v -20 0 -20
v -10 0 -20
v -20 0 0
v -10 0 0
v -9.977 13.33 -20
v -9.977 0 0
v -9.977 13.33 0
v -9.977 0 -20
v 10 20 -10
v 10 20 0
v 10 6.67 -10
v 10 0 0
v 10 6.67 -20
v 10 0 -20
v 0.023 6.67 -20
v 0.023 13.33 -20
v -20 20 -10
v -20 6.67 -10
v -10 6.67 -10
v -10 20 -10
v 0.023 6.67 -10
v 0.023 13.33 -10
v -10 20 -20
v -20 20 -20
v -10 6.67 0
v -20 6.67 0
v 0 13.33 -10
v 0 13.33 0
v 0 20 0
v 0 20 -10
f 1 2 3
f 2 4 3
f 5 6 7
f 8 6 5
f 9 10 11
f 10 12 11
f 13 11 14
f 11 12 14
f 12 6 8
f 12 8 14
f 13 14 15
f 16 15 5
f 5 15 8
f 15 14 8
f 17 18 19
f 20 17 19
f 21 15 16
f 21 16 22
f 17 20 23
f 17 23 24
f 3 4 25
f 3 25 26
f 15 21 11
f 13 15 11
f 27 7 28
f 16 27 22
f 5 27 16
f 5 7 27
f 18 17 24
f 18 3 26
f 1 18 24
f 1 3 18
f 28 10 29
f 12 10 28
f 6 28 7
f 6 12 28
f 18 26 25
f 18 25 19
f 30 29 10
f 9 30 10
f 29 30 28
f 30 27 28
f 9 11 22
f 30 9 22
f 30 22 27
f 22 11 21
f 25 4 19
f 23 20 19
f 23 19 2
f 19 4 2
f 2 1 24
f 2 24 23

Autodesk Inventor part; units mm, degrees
sketch "Sketch1" plane through (0, 0, 0) normal (0, 1, 0) x (-1, 0, 0)
  line L0 (0, 0) -> (30, 0)
  line L1 (30, 0) -> (30, -20)
  line L2 (30, -20) -> (0, -20)
  line L3 (0, -20) -> (0, 0)
  line L4 (0, 0) -> (10, 0)
  line L5 (10, 0) -> (10, -10)
  line L6 (10, -10) -> (0, -10)
  line L7 (0, -10) -> (0, 0)
  line L8 (10, 0) -> (20, 0)
  line L9 (20, 0) -> (20, -10)
  line L10 (20, -10) -> (10, -10)
  line L11 (10, -10) -> (10, 0)
  line L12 (20, 0) -> (30, 0)
  line L13 (30, 0) -> (30, -10)
  line L14 (30, -10) -> (20, -10)
  line L15 (20, -10) -> (20, 0)
  line L16 (0, -10) -> (10, -10)
  line L17 (10, -10) -> (10, -20)
  line L18 (10, -20) -> (0, -20)
  line L19 (0, -20) -> (0, -10)
  line L20 (10, -10) -> (20, -10)
  line L21 (20, -10) -> (20, -20)
  line L22 (20, -20) -> (10, -20)
  line L23 (10, -20) -> (10, -10)
  line L24 (20, -10) -> (30, -10)
  line L25 (30, -10) -> (30, -20)
  line L26 (30, -20) -> (20, -20)
  line L27 (20, -20) -> (20, -10)
  dimension "d0" = 30
  dimension "d1" = 20
  dimension "d2" = 10
  dimension "d3" = 10
extrude "Extrusion1" add sketch "Sketch1" along normal blind 20 contours L10 L21 L2 L17
ref_plane "Work Plane2" through (-10, 0, -10) normal (0, 1, 0) x (0, 0, -1)
sketch "Sketch2" plane through (-10, 0, -10) normal (0, 1, 0) x (0, 0, -1)
  line L0 (0, 0) -> (-10, 0)
  line L1 (-10, 0) -> (-10, 10)
  line L2 (-10, 10) -> (0, 10)
  line L3 (0, 10) -> (0, 0)
  point P0 (-10, -10)
  dimension "d6" = 10
  dimension "d7" = 10
extrude "Extrusion2" add sketch "Sketch2" along normal blind 6.67
ref_plane "Work Plane3" through (-10, 0, -10) normal (0, 1, 0) x (0, 0, -1)
sketch "Sketch3" plane through (-10, 0, -10) normal (0, 1, 0) x (0, 0, -1)
  line L0 (-10, -0.023) -> (10, -0.023)
  line L1 (10, -0.023) -> (10, -10.023)
  line L2 (10, -10.023) -> (-10, -10.023)
  line L3 (-10, -10.023) -> (-10, -0.023)
  point P0 (-10, -10)
  dimension "d10" = 20
  dimension "d11" = 10
extrude "Extrusion3" add sketch "Sketch3" along normal blind 13.33
ref_plane "Work Plane4" through (-10, 0, -10) normal (0, -1, 0) x (1, 0, 0)
sketch "Sketch4" plane through (-10, 0, -10) normal (0, -1, 0) x (1, 0, 0)
  line L0 (10, 10) -> (20, 10)
  line L1 (20, 10) -> (20, 0)
  line L2 (20, 0) -> (10, 0)
  line L3 (10, 0) -> (10, 10)
  dimension "d14" = 10
extrude "Extrusion4" add sketch "Sketch4" against normal blind 20
ref_plane "Work Plane5" through (-10, 0, -10) normal (0, -1, 0) x (1, 0, 0)
sketch "Sketch5" plane through (-10, 0, -10) normal (0, -1, 0) x (1, 0, 0)
  line L0 (10.023, 0) -> (20, 0)
  line L1 (20, 0) -> (20, -10)
  line L2 (20, -10) -> (10.023, -10)
  line L3 (10.023, -10) -> (10.023, 0)
  point P0 (10, 10)
extrude "Extrusion5" add sketch "Sketch5" against normal blind 6.67
properties part number "128_0"
